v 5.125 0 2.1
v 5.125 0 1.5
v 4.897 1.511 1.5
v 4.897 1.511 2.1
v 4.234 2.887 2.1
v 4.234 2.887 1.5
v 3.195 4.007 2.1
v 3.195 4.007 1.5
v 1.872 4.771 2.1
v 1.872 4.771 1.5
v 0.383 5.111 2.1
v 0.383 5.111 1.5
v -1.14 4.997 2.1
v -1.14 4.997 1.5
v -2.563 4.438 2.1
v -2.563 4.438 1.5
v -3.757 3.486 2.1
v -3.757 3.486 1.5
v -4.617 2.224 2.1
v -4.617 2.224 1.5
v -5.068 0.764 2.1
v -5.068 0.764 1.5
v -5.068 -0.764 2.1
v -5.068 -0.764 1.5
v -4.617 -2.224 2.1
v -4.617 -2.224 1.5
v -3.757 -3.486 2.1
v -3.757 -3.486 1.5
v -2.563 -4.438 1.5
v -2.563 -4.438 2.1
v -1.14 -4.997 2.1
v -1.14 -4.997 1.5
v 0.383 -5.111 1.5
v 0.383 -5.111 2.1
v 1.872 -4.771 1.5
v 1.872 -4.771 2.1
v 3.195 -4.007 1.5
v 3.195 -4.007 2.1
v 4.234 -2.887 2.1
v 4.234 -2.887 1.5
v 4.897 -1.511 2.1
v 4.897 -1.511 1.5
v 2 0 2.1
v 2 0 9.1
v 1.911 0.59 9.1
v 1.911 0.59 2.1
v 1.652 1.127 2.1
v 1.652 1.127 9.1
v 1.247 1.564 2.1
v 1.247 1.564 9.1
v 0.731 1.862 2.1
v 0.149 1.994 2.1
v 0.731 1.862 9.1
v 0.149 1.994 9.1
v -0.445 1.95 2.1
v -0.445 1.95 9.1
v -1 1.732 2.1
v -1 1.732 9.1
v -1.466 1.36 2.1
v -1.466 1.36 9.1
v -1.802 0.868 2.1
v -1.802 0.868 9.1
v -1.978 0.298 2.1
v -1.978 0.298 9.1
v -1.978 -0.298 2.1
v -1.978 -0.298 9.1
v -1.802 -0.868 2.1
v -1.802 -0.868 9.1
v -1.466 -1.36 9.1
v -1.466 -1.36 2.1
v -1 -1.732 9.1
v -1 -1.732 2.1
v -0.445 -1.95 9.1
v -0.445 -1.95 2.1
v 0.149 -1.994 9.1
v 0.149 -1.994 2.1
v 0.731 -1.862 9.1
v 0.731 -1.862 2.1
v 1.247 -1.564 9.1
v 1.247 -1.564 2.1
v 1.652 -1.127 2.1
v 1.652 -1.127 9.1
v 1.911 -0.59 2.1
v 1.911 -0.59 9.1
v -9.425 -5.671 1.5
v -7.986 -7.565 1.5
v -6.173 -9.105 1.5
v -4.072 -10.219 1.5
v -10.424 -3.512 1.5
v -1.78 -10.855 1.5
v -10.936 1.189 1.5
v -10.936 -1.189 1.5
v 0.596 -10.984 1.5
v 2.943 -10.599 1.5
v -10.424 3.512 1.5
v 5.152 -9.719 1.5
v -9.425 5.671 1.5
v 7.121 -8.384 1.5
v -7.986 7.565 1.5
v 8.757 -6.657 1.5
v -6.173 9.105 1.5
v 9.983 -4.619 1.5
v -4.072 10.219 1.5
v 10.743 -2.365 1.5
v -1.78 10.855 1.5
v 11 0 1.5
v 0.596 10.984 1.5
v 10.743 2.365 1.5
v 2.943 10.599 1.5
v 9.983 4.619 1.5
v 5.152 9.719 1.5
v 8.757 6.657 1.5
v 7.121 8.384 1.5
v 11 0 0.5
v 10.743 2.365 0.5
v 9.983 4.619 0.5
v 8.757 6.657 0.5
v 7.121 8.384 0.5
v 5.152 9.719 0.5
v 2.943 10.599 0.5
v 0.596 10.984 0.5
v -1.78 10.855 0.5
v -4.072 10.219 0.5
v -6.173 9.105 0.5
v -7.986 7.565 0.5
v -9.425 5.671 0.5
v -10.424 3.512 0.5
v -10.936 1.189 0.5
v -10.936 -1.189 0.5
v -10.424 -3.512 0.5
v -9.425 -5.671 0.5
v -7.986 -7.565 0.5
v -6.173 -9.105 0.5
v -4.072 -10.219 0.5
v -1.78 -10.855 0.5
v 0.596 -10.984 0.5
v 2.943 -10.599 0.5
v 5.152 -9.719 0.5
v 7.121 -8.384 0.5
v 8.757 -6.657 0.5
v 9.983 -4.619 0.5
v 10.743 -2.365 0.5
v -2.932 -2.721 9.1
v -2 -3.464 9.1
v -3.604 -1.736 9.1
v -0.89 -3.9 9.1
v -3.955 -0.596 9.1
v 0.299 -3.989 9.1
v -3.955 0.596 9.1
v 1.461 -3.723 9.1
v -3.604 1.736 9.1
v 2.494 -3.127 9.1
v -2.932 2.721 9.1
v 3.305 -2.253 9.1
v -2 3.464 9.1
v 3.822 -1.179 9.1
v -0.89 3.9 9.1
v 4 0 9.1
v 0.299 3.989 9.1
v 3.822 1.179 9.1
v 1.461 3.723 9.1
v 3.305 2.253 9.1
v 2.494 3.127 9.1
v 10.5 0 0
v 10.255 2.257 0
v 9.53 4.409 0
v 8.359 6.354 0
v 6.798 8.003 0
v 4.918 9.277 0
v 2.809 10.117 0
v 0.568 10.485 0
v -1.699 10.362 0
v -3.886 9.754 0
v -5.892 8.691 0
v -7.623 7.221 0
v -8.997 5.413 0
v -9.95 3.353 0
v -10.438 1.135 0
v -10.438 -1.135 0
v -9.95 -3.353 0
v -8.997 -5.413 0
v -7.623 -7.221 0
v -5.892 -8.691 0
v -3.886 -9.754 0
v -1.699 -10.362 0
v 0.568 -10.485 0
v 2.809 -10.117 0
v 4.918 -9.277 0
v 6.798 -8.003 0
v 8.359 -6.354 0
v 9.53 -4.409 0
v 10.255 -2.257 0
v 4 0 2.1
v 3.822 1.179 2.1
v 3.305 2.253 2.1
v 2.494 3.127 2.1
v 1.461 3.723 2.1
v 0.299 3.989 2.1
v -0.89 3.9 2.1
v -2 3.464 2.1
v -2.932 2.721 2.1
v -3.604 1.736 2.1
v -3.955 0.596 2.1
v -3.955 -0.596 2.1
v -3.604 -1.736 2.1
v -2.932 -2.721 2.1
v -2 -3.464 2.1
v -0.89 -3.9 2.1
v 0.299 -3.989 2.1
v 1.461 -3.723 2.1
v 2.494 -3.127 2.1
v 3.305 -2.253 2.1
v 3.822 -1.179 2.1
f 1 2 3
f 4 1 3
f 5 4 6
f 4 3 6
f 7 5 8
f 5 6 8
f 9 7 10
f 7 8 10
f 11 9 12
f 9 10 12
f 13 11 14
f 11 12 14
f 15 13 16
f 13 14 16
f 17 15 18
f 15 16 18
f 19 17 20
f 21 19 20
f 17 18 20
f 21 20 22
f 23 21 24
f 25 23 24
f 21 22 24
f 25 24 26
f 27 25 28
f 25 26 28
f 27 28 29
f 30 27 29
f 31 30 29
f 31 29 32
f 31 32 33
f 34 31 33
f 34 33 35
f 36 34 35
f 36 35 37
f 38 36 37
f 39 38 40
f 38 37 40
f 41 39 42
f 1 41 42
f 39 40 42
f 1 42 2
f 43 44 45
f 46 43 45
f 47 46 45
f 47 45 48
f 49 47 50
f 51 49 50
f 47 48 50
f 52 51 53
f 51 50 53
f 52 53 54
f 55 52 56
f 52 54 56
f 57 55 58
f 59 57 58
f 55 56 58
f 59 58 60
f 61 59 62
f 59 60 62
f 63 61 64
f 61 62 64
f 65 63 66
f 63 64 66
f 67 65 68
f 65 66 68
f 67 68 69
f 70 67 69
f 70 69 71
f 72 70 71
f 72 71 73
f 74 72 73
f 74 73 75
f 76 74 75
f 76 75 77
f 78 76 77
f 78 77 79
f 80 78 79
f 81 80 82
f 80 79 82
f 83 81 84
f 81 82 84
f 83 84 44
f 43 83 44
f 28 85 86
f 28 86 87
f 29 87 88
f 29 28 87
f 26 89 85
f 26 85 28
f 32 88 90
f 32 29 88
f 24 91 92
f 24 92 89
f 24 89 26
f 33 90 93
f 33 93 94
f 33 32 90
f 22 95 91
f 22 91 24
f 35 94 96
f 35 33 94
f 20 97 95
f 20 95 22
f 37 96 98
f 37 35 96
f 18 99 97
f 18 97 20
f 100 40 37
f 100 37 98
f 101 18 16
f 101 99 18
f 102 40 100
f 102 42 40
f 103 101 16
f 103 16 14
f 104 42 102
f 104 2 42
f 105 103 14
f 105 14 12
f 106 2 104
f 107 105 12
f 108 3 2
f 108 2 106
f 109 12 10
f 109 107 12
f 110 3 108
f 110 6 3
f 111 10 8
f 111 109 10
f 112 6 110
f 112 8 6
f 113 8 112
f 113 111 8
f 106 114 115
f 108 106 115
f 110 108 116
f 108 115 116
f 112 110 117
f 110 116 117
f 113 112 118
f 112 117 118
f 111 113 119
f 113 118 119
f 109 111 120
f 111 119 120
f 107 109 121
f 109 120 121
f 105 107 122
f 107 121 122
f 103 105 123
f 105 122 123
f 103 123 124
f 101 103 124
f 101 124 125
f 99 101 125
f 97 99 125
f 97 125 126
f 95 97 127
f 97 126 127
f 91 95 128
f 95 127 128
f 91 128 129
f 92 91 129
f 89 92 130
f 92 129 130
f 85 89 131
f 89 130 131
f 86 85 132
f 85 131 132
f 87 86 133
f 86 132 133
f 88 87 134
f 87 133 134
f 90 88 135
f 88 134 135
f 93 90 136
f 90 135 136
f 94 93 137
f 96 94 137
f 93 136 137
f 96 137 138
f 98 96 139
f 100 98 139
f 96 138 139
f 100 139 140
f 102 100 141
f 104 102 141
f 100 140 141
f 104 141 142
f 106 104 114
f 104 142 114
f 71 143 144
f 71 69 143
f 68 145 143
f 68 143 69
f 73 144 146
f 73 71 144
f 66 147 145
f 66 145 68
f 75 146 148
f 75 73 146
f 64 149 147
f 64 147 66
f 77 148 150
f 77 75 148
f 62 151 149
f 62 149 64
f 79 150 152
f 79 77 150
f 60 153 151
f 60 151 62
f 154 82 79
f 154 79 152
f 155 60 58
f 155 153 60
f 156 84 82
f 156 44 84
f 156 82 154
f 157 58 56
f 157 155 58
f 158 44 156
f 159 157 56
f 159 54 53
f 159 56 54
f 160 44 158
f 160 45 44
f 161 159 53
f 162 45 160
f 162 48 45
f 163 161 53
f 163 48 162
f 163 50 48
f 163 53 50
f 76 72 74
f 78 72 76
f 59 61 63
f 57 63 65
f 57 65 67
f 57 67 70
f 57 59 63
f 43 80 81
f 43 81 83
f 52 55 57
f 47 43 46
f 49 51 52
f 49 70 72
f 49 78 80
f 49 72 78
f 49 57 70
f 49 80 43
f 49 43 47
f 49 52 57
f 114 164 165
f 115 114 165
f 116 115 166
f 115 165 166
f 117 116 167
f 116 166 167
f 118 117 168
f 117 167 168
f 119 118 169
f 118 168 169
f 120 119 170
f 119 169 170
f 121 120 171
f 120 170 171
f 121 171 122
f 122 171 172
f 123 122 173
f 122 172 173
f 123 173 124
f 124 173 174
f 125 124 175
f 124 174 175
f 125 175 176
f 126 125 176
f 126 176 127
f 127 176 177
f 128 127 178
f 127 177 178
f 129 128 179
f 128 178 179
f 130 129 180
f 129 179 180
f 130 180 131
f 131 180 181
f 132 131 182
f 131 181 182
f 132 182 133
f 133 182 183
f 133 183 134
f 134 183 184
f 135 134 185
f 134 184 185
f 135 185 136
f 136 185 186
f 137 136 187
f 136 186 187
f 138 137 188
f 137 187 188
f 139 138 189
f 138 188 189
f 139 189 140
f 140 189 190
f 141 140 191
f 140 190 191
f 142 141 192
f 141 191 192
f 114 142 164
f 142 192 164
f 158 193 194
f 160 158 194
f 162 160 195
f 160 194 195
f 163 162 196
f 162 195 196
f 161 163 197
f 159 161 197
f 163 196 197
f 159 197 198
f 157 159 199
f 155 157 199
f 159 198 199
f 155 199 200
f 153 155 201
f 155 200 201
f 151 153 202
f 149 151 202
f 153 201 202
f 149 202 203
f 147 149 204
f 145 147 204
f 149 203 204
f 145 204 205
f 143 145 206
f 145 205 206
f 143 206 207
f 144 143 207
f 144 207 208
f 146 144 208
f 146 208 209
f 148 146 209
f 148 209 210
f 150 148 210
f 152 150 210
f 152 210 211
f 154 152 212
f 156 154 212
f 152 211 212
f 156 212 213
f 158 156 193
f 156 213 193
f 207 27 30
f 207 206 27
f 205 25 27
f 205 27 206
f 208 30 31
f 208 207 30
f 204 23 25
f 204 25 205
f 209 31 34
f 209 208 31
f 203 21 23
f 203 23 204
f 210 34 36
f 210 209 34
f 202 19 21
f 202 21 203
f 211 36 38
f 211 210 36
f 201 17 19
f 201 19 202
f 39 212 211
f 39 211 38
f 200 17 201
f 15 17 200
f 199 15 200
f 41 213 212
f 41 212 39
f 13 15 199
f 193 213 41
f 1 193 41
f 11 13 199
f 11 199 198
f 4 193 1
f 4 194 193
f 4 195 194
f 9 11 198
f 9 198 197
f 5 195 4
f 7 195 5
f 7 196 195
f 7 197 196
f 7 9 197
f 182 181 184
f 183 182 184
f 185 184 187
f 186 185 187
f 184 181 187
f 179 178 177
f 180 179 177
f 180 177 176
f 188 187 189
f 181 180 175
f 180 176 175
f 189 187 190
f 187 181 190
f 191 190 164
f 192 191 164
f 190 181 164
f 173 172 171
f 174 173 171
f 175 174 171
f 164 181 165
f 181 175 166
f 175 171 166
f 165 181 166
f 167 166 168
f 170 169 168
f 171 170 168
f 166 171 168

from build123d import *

# Parameters (mm, degrees)
F0_R     = 11
F1_DEPTH = 1.5
F2_R     = 5.125
F3_DEPTH = 0.6
F4_R     = 4
F5_DEPTH = 7
F6_R     = 2
F7_DEPTH = 7
F8_SIZE  = 0.5


with BuildPart() as f1:
    # F0 (on Top) → F1 (new body)
    with BuildSketch(Plane.XY):
        Circle(F0_R)
    extrude(amount=F1_DEPTH)

    # F2 (on face) → F3 (join)
    with BuildSketch(Plane.XY.offset(1.5)):
        Circle(F2_R)
    extrude(amount=F3_DEPTH)

    # F4 (on face) → F5 (join)
    with BuildSketch(Plane.XY.offset(2.1)):
        Circle(F4_R)
    extrude(amount=F5_DEPTH)

    # F6 (on face) → F7 (cut, through all)
    with BuildSketch(Plane.XY.offset(9.1)):
        Circle(F6_R)
    extrude(amount=-F7_DEPTH, mode=Mode.SUBTRACT)

    # F8
    f8_edges = [f1.edges().sort_by_distance(p)[0] for p in [
        (-11, 0, 0),
    ]]
    chamfer(f8_edges, length=F8_SIZE)


solid = f1.part
